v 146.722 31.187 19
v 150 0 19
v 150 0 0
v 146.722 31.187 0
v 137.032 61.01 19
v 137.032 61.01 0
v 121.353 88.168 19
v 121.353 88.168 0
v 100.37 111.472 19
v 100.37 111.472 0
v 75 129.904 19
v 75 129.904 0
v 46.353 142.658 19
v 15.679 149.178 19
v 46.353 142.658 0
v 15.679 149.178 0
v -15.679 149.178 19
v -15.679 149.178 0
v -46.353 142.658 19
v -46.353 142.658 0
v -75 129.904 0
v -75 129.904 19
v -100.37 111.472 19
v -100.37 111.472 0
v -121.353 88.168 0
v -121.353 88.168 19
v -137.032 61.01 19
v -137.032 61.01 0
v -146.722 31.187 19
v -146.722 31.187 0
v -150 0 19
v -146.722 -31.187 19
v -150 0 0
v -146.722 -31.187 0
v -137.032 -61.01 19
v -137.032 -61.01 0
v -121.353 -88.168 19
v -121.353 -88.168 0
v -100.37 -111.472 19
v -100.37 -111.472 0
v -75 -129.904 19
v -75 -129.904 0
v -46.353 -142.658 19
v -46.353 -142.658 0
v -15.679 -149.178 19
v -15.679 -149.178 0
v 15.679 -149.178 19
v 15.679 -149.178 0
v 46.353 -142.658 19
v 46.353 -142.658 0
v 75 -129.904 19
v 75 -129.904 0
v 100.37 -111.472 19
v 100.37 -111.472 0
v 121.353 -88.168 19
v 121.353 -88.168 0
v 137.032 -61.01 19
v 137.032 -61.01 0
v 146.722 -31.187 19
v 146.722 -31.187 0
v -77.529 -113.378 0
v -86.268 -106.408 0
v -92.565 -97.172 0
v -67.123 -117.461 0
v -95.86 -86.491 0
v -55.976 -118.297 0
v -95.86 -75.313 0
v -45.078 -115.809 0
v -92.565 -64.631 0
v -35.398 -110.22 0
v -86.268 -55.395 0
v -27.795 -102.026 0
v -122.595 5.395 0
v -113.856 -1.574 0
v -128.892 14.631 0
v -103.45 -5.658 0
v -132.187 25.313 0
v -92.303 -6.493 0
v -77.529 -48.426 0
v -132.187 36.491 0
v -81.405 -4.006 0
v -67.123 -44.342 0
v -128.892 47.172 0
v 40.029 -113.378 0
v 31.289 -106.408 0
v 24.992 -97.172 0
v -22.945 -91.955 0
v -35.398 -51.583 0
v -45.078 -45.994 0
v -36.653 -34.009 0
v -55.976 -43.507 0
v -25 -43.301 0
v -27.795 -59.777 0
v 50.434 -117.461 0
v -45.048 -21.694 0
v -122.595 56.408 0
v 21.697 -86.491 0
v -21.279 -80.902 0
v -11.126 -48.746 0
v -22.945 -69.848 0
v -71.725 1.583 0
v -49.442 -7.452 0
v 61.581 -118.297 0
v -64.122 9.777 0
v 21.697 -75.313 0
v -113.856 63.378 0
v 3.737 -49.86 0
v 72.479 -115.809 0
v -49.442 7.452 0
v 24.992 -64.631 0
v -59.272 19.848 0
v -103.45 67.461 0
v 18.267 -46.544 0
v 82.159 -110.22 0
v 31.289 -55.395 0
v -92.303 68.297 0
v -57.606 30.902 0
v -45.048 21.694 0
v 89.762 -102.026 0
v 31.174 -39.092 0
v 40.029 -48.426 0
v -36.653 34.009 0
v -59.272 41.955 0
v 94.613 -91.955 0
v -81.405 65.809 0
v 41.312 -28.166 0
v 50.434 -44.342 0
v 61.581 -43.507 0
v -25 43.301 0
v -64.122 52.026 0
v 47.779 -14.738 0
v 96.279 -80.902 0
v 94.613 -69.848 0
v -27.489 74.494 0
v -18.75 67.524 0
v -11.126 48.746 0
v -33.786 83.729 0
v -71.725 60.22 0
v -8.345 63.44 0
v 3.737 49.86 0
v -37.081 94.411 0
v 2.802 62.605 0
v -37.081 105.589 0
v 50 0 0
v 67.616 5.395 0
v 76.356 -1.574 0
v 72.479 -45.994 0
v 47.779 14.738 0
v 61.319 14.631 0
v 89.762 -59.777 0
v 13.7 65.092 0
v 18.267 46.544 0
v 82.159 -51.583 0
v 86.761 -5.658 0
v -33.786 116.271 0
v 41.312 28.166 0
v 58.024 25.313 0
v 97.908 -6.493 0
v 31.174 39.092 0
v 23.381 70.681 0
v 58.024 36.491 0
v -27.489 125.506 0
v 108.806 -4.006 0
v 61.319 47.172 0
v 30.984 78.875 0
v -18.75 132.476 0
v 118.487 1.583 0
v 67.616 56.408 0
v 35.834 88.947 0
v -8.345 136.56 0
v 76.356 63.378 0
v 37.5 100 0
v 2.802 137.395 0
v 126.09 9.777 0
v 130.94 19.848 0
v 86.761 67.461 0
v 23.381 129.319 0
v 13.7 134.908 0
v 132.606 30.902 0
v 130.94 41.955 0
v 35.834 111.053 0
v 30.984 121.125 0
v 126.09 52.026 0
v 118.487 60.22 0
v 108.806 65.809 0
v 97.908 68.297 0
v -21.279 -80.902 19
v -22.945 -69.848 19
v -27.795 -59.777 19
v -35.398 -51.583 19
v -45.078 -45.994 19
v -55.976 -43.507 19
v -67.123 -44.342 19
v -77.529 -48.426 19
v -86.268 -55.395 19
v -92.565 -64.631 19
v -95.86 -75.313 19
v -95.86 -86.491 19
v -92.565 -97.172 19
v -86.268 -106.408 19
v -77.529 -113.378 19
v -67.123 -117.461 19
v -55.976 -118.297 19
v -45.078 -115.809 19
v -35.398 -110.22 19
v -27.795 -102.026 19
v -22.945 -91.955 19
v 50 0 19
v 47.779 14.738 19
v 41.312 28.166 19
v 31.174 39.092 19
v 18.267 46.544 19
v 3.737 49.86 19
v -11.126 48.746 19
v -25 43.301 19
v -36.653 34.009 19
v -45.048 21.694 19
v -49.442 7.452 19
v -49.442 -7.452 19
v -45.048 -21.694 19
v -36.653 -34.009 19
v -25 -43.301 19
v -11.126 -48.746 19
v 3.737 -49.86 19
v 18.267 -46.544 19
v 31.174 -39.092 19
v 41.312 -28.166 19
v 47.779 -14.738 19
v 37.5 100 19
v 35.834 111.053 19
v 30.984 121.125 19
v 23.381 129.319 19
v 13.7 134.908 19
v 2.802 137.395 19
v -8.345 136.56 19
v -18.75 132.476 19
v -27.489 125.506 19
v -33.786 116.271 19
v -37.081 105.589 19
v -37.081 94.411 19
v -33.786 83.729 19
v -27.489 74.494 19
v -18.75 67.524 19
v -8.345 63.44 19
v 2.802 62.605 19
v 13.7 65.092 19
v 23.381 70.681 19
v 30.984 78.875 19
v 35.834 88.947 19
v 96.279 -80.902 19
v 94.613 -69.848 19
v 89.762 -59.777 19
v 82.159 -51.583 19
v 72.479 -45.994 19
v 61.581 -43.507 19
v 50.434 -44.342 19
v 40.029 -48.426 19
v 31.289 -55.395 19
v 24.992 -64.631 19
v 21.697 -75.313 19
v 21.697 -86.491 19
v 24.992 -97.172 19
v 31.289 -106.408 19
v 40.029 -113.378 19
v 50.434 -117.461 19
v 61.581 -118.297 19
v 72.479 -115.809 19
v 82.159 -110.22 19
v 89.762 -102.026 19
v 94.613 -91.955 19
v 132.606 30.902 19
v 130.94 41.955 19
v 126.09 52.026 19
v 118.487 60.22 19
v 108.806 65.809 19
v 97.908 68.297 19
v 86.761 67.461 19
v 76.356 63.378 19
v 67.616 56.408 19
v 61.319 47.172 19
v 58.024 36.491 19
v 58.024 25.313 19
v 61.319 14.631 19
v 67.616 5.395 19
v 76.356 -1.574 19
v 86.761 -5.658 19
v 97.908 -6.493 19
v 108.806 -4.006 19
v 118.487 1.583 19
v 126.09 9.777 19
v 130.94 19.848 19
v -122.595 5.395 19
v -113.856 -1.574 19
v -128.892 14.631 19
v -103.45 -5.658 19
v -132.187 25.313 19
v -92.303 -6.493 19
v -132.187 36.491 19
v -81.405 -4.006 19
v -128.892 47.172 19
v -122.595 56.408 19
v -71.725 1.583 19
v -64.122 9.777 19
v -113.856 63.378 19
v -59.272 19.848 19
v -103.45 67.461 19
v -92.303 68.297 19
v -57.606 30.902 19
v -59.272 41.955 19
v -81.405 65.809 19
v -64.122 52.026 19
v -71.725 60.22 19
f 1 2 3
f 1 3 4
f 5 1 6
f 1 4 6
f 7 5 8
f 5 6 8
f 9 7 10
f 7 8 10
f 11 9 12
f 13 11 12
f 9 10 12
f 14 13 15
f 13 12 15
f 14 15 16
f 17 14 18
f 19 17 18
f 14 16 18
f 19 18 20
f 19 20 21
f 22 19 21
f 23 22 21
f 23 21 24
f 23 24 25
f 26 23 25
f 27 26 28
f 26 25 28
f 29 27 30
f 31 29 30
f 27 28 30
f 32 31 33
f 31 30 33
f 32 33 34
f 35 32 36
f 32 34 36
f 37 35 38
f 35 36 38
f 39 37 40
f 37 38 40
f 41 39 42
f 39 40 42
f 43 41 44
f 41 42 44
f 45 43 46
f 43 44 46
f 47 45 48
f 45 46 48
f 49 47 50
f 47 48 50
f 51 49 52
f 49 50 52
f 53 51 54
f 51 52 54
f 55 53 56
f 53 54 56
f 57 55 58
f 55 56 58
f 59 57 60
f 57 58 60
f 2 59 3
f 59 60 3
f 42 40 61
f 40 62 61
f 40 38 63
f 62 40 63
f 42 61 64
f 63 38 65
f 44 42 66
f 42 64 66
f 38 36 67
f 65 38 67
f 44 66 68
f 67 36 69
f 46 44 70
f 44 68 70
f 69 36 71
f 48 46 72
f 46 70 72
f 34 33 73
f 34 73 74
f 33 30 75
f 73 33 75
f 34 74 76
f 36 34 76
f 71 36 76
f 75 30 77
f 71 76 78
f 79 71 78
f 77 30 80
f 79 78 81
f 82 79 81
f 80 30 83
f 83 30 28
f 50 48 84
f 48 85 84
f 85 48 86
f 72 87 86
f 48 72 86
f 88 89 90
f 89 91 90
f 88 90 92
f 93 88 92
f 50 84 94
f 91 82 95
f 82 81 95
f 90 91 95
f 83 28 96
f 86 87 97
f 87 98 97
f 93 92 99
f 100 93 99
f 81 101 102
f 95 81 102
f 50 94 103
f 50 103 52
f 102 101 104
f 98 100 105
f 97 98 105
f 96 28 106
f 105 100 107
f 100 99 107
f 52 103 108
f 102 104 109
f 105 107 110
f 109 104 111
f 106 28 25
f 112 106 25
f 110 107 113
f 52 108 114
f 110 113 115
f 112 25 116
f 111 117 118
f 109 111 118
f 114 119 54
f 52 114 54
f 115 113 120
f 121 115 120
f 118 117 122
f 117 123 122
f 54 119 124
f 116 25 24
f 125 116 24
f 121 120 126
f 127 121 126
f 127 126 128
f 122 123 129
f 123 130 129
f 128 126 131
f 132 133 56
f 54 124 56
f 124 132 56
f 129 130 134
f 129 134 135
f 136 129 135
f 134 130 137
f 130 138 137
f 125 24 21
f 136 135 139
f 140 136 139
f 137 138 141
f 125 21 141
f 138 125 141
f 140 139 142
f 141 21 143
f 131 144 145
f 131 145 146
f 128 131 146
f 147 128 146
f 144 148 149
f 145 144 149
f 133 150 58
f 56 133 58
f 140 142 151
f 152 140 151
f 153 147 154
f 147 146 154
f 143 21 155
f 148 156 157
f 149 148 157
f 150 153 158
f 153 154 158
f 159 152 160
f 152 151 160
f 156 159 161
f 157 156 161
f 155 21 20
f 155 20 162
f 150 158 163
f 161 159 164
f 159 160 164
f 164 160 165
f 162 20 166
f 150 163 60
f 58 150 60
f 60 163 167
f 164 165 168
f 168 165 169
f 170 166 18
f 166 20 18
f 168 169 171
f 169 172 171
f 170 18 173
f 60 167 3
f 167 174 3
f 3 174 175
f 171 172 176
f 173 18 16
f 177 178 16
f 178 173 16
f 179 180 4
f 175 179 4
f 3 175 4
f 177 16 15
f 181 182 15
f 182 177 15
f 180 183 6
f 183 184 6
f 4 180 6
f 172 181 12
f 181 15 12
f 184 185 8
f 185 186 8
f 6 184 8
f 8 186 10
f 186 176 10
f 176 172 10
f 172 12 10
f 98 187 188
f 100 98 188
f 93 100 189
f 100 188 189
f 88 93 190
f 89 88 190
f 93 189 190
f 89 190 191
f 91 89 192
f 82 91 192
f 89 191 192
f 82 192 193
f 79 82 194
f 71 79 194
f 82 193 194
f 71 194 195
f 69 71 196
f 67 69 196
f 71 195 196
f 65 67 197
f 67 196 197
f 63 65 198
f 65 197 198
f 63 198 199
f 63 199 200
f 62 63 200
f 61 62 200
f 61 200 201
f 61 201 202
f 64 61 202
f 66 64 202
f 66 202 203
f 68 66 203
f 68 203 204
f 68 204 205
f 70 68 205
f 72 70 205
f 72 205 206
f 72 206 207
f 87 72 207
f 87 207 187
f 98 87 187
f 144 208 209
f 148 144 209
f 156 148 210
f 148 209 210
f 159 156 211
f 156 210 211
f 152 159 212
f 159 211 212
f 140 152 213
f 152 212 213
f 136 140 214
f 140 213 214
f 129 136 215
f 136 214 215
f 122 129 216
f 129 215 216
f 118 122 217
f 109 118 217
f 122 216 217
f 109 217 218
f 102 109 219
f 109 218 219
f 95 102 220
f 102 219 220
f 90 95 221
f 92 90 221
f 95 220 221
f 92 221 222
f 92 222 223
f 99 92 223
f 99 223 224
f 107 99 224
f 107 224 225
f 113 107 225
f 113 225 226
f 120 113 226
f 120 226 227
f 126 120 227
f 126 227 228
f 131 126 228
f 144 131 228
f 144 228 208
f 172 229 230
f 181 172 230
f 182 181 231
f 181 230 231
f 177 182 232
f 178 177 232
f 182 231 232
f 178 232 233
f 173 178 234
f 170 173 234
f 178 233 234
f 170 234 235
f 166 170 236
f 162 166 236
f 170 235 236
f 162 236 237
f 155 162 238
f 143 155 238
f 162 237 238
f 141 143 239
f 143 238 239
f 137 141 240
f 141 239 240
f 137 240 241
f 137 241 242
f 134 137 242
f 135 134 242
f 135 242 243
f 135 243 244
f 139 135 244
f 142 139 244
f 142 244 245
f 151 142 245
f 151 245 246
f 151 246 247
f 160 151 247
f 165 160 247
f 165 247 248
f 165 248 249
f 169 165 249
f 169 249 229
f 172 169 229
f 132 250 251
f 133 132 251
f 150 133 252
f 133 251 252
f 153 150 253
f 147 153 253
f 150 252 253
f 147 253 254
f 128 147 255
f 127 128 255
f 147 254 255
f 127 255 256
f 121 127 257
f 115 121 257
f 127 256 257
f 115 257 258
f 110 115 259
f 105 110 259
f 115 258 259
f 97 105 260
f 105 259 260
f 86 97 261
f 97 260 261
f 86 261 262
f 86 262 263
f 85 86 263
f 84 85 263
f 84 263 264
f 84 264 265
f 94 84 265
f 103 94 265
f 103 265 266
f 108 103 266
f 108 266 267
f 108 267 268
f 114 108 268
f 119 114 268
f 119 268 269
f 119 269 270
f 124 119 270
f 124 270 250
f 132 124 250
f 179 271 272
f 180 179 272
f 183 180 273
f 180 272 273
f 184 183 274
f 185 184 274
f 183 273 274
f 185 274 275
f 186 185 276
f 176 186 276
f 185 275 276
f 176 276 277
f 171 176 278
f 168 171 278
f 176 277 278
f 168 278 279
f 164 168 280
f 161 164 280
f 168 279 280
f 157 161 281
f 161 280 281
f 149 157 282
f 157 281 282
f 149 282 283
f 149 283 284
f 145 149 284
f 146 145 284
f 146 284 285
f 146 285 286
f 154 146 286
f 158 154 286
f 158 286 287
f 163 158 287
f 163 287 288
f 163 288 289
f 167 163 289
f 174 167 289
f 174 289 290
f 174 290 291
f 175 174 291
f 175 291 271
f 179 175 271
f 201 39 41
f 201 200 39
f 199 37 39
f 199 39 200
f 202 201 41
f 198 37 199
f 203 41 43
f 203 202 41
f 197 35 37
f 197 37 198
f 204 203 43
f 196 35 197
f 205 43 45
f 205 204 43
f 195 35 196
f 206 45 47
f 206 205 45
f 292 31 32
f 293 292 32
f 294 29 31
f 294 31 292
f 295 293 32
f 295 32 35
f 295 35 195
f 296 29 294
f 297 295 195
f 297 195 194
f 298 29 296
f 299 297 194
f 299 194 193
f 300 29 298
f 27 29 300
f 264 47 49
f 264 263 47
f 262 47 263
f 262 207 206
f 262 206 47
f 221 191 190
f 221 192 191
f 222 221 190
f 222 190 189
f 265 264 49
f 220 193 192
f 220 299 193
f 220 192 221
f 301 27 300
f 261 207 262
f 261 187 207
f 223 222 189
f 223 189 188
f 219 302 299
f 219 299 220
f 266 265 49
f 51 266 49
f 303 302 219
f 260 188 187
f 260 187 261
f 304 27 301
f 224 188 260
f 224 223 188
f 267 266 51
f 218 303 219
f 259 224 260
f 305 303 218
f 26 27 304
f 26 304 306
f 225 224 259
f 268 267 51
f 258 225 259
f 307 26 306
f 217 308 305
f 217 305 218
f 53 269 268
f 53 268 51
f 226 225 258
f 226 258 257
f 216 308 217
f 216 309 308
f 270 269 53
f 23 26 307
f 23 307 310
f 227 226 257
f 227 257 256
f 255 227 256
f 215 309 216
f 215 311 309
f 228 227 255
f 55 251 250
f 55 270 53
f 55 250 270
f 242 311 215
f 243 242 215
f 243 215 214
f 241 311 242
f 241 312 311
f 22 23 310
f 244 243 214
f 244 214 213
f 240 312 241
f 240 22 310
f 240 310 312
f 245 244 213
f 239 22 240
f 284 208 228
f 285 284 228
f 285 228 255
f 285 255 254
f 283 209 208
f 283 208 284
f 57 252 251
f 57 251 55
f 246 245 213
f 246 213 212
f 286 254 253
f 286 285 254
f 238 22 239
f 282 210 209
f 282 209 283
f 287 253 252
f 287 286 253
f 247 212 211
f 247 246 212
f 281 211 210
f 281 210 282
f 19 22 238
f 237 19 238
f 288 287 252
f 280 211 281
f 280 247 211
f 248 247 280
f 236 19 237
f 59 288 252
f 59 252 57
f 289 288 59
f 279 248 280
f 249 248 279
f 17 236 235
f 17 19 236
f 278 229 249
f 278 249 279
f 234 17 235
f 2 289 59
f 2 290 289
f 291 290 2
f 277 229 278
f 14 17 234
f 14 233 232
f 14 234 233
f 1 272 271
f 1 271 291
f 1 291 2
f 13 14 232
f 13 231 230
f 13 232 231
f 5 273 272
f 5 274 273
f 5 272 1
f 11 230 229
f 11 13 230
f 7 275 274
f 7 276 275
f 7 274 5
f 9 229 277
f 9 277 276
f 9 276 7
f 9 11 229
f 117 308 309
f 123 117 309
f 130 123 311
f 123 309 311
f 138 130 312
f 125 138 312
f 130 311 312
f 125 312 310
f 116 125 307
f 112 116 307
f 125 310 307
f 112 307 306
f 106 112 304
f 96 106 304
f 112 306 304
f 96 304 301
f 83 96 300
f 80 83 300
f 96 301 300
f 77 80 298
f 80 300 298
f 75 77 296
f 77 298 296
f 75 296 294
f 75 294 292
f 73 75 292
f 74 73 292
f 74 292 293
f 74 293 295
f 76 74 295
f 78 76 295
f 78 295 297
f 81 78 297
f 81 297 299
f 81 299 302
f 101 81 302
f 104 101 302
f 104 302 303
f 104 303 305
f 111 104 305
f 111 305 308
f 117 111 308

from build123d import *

# Parameters (mm, degrees)
F0_R     = 150
F1_DEPTH = 19
F2_R     = 50
F2_R_2   = 37.5
F3_DEPTH = 53


with BuildPart() as f1:
    # F0 (on Top) → F1 (new body)
    with BuildSketch(Plane.XY):
        Circle(F0_R)
    extrude(amount=F1_DEPTH)

    # F2 (on face) → F3 (cut)
    with BuildSketch(Plane.XY.offset(19)):
        Circle(F2_R)
        with Locations((0, 100)):
            Circle(F2_R_2)
        with Locations((-95.105652, 30.901699)):
            Circle(F2_R_2)
        with Locations((-58.778525, -80.901699)):
            Circle(F2_R_2)
        with Locations((58.778525, -80.901699)):
            Circle(F2_R_2)
        with Locations((95.105652, 30.901699)):
            Circle(F2_R_2)
    extrude(amount=-F3_DEPTH, mode=Mode.SUBTRACT)


solid = f1.part
